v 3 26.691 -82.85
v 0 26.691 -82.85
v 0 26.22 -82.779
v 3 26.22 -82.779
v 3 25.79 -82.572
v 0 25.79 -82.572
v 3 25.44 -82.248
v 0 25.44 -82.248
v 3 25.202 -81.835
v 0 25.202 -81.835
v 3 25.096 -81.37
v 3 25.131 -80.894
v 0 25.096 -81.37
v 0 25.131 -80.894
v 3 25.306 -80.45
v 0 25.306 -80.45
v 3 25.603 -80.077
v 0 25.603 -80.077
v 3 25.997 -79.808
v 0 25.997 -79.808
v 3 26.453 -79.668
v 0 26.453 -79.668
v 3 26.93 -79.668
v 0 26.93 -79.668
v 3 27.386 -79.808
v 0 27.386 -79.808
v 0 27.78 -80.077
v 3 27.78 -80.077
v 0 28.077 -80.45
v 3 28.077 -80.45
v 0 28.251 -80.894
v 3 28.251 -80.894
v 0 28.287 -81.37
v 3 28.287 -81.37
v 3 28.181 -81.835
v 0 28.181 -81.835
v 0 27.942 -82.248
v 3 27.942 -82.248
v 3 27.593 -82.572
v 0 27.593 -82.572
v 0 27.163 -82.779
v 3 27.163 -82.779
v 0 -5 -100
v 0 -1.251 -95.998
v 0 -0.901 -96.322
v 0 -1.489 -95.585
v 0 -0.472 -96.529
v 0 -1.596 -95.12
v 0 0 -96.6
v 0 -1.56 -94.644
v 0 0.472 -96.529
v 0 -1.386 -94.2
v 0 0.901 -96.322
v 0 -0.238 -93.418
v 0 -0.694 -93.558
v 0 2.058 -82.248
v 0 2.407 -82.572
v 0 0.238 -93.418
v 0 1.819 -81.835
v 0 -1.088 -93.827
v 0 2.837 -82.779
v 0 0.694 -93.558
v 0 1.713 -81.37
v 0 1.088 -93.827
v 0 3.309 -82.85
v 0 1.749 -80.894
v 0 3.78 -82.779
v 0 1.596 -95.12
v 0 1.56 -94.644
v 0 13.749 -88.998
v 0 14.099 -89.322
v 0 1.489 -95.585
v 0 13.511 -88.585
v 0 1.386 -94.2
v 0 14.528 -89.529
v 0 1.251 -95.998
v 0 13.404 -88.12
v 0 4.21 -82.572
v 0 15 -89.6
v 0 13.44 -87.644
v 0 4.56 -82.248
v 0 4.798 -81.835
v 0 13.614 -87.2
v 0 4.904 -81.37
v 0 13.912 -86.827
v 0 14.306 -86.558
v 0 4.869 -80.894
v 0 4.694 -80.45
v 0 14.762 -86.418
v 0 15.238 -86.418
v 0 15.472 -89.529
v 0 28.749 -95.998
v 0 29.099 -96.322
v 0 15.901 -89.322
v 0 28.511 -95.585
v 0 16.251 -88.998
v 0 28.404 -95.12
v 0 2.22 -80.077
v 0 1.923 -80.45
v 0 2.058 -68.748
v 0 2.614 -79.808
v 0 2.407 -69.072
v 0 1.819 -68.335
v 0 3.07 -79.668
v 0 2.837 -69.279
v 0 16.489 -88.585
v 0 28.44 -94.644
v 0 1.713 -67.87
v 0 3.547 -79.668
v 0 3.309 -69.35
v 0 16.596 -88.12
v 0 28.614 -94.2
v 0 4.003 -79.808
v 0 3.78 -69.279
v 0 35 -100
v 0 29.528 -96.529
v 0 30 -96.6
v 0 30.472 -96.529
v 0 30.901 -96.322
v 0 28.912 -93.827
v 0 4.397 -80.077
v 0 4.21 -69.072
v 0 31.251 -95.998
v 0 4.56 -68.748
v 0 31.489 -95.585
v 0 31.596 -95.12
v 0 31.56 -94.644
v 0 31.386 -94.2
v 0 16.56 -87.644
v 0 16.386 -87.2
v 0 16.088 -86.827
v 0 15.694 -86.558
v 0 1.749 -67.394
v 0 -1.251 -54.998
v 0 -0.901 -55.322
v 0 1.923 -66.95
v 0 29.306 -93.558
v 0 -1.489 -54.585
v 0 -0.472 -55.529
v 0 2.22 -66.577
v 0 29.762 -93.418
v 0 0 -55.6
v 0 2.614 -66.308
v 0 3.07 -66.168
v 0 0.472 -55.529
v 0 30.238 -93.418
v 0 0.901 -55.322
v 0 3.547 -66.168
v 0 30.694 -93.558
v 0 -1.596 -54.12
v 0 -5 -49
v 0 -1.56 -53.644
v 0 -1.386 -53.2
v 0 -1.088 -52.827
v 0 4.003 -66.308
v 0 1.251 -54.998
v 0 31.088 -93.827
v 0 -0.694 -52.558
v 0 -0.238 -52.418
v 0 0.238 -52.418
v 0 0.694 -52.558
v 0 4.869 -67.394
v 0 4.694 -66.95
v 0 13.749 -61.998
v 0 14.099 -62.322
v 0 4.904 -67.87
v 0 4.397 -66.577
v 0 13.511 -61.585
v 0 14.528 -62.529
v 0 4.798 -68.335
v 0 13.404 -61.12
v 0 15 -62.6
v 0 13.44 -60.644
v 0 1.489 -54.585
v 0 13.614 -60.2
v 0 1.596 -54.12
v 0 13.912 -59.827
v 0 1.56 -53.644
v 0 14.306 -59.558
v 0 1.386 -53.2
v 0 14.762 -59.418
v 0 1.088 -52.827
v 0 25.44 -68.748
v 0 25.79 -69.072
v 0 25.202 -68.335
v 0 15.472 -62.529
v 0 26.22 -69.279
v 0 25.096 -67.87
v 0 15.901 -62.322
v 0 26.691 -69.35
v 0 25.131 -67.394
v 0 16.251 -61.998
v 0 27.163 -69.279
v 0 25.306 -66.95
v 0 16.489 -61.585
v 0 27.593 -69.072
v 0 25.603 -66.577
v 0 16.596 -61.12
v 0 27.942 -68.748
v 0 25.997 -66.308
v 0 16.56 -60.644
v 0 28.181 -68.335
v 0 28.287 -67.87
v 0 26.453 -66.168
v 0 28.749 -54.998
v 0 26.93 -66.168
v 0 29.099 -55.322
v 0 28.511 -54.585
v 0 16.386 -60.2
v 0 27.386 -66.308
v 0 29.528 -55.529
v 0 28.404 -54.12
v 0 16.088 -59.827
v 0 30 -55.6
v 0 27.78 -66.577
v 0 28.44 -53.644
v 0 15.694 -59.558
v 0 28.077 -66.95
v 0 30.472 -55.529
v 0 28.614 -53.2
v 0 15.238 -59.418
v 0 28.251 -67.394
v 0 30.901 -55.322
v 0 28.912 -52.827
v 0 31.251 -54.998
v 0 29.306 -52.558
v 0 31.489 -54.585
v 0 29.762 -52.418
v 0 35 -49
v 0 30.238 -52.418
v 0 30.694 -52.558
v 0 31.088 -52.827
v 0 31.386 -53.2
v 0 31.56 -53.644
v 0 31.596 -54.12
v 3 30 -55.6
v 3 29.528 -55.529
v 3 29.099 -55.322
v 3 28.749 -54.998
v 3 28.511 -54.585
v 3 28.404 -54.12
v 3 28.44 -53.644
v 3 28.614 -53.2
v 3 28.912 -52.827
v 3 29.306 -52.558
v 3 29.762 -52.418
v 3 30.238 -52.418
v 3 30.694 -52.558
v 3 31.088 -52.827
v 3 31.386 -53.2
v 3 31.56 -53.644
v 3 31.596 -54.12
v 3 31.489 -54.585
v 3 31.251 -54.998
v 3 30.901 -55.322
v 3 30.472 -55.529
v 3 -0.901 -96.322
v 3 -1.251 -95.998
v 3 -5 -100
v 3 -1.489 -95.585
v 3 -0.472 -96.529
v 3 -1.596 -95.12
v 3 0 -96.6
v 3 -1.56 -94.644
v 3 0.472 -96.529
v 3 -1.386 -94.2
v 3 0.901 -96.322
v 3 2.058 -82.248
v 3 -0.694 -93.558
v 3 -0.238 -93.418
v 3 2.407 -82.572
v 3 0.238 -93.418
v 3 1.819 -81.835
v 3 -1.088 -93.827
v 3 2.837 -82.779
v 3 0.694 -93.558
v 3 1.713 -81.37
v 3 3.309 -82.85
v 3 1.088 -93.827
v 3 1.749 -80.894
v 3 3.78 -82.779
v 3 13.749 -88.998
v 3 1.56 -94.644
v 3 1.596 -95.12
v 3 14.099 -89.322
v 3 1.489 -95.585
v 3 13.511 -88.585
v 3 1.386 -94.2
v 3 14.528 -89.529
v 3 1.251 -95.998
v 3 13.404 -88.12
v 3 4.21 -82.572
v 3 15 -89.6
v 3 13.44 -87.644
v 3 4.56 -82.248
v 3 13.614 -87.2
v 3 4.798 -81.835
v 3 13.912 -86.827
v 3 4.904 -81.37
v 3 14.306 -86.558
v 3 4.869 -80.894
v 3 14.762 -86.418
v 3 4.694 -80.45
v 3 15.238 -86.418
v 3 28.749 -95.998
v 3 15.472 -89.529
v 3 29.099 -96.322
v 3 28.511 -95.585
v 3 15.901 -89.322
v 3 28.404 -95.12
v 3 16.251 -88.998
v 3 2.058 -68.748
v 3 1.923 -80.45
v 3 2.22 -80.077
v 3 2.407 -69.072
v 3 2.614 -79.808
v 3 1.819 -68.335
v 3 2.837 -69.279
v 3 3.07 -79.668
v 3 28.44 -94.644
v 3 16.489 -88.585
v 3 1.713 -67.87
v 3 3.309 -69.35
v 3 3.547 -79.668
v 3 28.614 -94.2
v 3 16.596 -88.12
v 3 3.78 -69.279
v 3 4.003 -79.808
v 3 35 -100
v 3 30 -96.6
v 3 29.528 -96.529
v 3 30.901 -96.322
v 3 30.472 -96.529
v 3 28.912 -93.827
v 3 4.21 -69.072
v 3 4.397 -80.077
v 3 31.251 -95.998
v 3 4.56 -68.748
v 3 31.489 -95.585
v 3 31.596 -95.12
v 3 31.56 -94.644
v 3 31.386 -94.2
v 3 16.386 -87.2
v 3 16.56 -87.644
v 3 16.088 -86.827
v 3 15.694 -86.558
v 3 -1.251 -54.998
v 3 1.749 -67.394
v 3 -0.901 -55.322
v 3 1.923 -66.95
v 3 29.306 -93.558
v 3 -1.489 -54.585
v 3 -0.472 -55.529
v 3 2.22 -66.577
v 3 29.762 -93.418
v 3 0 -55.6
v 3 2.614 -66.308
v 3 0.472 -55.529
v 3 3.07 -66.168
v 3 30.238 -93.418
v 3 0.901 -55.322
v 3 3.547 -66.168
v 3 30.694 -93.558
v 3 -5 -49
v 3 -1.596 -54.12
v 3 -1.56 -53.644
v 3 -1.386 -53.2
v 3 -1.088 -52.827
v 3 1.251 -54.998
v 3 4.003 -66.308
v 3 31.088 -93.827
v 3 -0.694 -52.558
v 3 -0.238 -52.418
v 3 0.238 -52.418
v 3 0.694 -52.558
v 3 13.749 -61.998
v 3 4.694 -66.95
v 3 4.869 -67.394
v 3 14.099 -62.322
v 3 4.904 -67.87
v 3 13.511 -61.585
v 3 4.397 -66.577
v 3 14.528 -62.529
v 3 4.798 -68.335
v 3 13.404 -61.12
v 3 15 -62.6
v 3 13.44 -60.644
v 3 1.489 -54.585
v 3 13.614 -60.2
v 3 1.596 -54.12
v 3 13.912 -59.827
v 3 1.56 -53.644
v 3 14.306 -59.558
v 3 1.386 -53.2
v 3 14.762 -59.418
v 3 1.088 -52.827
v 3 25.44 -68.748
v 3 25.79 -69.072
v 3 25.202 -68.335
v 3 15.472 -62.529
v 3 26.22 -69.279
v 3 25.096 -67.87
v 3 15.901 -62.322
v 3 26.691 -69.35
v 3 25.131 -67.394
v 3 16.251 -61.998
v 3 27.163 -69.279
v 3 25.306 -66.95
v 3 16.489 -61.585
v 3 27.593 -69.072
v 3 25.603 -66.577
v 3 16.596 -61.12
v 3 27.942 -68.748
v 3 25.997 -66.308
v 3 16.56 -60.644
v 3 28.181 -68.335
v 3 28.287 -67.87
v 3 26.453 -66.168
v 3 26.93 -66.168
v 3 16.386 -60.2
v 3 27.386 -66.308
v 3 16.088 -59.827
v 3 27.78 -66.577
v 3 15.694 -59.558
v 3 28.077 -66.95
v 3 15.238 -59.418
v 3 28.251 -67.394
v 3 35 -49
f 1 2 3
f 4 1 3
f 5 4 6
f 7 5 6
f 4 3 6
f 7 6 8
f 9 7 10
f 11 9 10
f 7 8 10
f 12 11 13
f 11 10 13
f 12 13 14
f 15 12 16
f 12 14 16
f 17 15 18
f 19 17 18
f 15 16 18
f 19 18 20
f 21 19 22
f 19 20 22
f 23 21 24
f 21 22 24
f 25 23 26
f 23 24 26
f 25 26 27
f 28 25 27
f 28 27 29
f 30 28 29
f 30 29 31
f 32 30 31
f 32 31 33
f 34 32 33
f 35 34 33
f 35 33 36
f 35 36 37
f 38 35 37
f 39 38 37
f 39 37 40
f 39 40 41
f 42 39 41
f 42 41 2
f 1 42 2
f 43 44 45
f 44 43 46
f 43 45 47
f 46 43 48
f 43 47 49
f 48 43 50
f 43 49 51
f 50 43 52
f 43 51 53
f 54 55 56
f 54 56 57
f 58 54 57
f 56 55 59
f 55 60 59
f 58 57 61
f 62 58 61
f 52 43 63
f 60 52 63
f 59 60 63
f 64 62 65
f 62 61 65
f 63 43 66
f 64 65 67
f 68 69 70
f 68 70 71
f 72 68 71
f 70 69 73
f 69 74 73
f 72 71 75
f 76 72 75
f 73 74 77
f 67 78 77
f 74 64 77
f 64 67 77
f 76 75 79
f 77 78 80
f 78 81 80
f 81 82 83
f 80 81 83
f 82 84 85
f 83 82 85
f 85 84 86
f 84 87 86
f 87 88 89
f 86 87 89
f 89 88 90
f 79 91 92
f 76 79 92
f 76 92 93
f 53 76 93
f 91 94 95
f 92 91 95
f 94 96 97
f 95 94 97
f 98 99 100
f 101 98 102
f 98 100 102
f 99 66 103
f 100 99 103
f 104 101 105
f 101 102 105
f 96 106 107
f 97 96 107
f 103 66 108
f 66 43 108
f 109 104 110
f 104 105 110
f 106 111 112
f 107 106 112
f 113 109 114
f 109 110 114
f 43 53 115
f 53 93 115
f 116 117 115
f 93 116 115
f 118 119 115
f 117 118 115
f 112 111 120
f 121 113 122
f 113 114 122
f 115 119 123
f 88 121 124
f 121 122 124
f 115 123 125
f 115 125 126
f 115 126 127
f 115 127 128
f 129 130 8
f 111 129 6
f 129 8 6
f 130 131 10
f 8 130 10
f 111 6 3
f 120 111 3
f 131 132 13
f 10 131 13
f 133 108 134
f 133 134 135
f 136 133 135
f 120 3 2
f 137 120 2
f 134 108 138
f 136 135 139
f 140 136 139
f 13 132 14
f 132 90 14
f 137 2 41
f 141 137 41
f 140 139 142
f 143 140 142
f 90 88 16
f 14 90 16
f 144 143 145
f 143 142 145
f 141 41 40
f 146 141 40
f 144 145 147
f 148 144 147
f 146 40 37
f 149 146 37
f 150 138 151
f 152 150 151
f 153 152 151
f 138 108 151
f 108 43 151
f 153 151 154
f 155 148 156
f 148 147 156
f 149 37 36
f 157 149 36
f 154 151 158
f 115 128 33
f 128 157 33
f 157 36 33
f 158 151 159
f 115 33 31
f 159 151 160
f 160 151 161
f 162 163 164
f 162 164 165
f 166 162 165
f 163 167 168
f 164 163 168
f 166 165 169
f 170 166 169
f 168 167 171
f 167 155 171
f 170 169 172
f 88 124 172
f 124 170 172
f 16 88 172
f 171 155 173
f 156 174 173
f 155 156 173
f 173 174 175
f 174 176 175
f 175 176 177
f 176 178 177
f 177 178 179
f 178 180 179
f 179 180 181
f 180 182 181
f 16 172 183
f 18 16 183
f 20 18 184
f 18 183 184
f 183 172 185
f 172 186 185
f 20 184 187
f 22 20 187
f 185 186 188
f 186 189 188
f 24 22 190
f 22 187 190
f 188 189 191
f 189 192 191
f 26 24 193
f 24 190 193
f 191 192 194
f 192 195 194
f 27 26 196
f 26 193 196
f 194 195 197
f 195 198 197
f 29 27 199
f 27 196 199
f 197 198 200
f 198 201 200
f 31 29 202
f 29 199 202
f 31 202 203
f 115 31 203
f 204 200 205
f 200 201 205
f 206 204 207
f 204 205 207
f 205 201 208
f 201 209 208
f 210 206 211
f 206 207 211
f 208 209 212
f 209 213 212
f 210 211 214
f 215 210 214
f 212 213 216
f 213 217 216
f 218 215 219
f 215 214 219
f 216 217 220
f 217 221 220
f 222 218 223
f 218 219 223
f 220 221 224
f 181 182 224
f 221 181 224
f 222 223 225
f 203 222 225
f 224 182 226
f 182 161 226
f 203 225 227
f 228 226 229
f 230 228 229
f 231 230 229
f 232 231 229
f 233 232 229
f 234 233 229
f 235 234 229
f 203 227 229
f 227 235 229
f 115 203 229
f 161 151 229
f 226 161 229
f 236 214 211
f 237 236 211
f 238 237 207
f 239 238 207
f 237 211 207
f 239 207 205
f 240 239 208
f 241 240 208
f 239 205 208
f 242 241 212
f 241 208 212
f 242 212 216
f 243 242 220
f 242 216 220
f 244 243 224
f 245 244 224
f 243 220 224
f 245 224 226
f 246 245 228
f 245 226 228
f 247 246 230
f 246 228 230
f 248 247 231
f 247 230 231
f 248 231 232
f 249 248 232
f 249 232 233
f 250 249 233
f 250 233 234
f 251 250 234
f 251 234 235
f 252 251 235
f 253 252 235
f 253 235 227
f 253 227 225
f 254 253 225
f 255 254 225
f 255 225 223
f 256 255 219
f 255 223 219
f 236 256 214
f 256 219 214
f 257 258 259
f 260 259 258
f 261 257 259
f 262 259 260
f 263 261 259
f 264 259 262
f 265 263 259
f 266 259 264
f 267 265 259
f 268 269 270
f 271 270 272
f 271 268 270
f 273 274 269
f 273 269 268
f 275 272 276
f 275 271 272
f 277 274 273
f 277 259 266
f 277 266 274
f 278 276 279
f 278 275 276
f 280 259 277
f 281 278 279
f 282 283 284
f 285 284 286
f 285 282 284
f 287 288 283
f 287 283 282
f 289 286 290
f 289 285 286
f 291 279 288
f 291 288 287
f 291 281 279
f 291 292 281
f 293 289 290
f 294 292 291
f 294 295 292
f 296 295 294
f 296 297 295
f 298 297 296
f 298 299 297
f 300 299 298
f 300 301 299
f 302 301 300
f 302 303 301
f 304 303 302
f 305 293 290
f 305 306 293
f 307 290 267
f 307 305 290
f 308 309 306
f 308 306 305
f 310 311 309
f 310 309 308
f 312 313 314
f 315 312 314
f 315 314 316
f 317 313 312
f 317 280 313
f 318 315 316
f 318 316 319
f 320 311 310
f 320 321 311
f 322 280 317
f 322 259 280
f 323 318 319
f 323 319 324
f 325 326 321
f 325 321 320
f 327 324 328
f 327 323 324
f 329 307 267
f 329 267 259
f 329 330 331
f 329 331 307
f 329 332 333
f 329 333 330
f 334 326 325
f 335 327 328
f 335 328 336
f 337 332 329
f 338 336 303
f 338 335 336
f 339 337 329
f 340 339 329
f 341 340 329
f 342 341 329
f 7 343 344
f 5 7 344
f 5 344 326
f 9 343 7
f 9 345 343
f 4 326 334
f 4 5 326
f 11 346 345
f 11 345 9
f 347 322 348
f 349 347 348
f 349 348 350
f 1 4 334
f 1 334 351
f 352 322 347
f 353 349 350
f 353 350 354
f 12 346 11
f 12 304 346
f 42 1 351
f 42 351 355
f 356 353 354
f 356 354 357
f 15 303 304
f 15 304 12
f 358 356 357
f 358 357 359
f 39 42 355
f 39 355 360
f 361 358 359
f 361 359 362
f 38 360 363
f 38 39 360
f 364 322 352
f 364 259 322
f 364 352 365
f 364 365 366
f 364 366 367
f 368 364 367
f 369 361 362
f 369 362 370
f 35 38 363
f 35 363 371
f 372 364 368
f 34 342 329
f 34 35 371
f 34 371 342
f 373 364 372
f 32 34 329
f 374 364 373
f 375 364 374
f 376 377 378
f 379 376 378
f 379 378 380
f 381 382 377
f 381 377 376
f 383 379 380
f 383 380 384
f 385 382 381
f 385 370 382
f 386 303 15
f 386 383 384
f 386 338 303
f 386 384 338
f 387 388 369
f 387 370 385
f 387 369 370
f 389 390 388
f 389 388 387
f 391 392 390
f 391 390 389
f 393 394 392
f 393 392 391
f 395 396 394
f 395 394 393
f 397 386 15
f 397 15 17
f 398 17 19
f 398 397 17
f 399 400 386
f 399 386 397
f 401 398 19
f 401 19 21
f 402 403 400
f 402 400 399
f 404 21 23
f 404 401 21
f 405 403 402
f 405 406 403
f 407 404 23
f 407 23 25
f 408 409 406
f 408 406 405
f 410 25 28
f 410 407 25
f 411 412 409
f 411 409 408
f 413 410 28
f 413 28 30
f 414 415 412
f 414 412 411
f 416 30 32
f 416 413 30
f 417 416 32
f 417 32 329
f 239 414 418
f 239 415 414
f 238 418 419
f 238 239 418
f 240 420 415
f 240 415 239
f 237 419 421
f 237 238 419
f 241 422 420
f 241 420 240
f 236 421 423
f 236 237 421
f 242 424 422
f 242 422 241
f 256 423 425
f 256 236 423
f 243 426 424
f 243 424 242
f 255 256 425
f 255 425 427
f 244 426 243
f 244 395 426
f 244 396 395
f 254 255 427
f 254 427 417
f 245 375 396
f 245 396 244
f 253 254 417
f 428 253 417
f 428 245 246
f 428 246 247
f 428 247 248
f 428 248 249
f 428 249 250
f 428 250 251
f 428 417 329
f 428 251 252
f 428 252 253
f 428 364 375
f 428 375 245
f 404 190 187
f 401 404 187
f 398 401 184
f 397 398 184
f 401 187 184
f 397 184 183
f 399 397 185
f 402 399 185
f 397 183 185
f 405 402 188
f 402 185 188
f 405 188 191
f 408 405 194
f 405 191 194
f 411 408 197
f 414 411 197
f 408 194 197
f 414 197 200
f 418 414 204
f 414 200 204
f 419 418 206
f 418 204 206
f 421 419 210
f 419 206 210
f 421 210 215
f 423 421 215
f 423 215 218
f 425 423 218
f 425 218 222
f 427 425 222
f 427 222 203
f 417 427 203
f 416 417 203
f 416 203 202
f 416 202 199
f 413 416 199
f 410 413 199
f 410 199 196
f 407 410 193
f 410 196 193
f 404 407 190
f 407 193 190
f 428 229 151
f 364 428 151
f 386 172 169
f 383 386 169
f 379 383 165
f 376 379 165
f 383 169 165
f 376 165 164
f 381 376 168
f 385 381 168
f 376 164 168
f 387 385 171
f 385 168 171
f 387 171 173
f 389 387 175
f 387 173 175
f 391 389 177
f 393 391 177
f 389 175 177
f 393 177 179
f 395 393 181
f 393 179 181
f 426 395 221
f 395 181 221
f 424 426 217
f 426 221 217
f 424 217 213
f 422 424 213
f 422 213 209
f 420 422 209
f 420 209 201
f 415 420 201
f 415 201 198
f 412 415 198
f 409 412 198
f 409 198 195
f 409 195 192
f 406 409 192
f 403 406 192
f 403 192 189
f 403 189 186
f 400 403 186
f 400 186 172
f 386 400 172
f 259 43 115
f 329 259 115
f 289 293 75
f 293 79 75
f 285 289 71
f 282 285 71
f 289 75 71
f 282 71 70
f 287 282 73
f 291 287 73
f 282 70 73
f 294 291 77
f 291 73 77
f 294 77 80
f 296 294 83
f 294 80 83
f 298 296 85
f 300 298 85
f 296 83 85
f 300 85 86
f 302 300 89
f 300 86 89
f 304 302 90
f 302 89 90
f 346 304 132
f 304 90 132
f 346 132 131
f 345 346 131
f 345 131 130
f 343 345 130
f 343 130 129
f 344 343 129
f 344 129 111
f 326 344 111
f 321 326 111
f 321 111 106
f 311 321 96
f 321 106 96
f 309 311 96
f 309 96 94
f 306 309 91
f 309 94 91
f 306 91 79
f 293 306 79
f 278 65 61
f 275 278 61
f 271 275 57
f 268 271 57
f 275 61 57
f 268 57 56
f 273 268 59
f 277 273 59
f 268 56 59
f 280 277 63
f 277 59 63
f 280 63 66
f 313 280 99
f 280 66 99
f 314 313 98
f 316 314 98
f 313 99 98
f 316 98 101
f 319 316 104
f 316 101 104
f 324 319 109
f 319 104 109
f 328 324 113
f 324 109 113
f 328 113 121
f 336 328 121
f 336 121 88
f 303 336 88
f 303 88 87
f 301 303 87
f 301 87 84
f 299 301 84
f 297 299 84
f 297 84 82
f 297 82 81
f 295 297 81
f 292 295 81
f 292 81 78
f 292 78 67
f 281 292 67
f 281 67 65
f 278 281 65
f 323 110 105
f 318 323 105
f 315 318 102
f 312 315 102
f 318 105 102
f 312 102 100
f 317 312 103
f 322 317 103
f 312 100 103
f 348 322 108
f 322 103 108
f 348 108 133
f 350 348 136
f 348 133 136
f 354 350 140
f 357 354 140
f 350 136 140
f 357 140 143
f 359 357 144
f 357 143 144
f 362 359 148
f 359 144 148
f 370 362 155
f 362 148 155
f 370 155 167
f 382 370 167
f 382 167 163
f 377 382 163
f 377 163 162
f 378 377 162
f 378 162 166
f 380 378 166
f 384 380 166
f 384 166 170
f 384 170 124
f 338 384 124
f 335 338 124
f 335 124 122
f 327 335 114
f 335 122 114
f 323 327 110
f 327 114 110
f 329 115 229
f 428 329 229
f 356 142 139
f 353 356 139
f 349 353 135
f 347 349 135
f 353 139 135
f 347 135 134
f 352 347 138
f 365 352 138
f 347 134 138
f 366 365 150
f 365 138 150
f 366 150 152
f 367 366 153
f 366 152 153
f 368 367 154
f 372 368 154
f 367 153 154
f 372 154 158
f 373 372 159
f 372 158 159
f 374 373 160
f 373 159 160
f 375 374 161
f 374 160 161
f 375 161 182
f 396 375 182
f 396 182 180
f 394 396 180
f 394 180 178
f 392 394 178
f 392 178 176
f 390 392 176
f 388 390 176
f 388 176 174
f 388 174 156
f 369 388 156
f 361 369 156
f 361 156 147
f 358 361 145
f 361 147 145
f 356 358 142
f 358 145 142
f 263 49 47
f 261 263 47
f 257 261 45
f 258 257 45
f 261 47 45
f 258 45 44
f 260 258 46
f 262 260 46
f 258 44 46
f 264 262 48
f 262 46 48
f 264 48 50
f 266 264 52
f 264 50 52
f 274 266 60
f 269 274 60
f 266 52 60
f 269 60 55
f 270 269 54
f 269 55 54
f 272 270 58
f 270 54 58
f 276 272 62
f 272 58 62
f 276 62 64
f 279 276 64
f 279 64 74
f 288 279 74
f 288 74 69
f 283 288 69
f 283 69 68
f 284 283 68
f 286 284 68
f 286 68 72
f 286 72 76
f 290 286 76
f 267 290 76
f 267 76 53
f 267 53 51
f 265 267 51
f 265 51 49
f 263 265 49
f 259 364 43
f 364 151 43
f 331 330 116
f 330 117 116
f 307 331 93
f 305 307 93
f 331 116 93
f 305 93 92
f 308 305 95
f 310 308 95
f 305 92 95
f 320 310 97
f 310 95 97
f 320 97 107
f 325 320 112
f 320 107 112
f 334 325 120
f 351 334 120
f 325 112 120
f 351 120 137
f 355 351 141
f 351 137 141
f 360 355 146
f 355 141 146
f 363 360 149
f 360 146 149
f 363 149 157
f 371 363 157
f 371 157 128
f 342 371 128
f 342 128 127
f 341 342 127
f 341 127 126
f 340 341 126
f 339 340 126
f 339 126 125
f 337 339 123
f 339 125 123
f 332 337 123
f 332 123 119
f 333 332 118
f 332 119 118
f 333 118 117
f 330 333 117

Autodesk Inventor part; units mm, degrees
ref_plane "YZ Plane" through (0, 0, 0) normal (1, 0, 0) x (0, 1, 0)
ref_plane "XZ Plane" through (0, 0, 0) normal (0, 1, 0) x (-1, 0, 0)
ref_plane "XY Plane" through (0, 0, 0) normal (0, 0, 1) x (1, 0, 0)
sketch "スケッチ1" plane through (0, 0, 0) normal (1, 0, 0) x (0, 1, 0)
  line L0 (35, -49) -> (-5, -49)
  line L1 (-5, -49) -> (-5, -100)
  line L2 (-5, -100) -> (35, -100)
  line L3 (35, -100) -> (35, -49)
  dimension "d1" = 40
  dimension "d2" = 51
extrude "押し出し1" add sketch "スケッチ1" along normal blind 3
sketch "スケッチ4" plane through (3, 0, 0) normal (1, 0, 0) x (0, 0, -1)
  line L0 (54, 30) -> (95, 30)
  line L1 (95, 30) -> (95, 0)
  line L2 (95, 0) -> (54, 0)
  line L3 (54, 0) -> (54, 30)
  line L4 (100, 35) -> (49, 35) projected
  line L5 (100, -5) -> (100, 35) projected
  point P0 (0, 0)
  dimension "d29" = 41
  dimension "d30" = 30
  dimension "d31" = 5
  dimension "d32" = 5
hole "穴2" at (3, 30, -54) at (3, 0, -54) at (3, 0, -95) at (3, 30, -95) direction (-1, 0, 0) diameter 3.2 end through all
sketch "スケッチ6" plane through (3, 0, 0) normal (1, 0, 0) x (0, 0, -1)
  line L0 (49, 35) -> (49, -5) projected
  line L1 (49, 15) -> (100, 15)
  line L2 (100, -5) -> (100, 35) projected
  circle A0 centre (74.5, 15) radius 13.5
  point P0 (0, 0)
  point P1 (88, 15)
  point P2 (81.25, 26.6913)
  point P3 (67.75, 26.6913)
  point P4 (61, 15)
  point P5 (67.75, 3.3087)
  point P6 (81.25, 3.3087)
  dimension "d53" = 27
  dimension "d56" = 360
hole "穴4" at (3, 15, -88) at (3, 26.6913, -81.25) at (3, 26.6913, -67.75) at (3, 15, -61) at (3, 3.3087, -67.75) at (3, 3.3087, -81.25) direction (-1, 0, 0) diameter 3.2 end through all
properties part number "link5_plate2" material "アルミニウム 6061"
